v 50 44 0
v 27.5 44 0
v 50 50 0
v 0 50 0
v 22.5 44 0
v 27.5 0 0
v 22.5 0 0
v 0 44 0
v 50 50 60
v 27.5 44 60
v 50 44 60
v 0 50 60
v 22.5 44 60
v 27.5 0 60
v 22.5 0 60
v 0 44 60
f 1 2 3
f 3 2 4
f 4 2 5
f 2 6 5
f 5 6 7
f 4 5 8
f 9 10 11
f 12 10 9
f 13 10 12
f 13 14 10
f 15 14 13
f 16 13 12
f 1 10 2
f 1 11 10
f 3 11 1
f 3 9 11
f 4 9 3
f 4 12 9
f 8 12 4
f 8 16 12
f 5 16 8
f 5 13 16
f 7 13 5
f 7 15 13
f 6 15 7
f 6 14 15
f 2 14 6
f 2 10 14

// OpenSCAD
$fn = 32;

// ----------------------------------------------------------------------
// Structural section: tee 50 x 50 mm
// ----------------------------------------------------------------------

// --- parameters (mm) ---
sec_w = 50;               // tee width, X
sec_h = 50;               // tee height, Y
flange_t = 6;             // top flange thickness
web_t = 5;                // web thickness
plate_t = 60;             // cut length, Z (extrusion height)

profile = [[22.5, 0], [27.5, 0], [27.5, 44], [50, 44], [50, 50], [0, 50], [0, 44], [22.5, 44]];  // primary outline, 8 points, counter clockwise

// --- the one profile operation ---
linear_extrude(height = plate_t) polygon(points = profile);
